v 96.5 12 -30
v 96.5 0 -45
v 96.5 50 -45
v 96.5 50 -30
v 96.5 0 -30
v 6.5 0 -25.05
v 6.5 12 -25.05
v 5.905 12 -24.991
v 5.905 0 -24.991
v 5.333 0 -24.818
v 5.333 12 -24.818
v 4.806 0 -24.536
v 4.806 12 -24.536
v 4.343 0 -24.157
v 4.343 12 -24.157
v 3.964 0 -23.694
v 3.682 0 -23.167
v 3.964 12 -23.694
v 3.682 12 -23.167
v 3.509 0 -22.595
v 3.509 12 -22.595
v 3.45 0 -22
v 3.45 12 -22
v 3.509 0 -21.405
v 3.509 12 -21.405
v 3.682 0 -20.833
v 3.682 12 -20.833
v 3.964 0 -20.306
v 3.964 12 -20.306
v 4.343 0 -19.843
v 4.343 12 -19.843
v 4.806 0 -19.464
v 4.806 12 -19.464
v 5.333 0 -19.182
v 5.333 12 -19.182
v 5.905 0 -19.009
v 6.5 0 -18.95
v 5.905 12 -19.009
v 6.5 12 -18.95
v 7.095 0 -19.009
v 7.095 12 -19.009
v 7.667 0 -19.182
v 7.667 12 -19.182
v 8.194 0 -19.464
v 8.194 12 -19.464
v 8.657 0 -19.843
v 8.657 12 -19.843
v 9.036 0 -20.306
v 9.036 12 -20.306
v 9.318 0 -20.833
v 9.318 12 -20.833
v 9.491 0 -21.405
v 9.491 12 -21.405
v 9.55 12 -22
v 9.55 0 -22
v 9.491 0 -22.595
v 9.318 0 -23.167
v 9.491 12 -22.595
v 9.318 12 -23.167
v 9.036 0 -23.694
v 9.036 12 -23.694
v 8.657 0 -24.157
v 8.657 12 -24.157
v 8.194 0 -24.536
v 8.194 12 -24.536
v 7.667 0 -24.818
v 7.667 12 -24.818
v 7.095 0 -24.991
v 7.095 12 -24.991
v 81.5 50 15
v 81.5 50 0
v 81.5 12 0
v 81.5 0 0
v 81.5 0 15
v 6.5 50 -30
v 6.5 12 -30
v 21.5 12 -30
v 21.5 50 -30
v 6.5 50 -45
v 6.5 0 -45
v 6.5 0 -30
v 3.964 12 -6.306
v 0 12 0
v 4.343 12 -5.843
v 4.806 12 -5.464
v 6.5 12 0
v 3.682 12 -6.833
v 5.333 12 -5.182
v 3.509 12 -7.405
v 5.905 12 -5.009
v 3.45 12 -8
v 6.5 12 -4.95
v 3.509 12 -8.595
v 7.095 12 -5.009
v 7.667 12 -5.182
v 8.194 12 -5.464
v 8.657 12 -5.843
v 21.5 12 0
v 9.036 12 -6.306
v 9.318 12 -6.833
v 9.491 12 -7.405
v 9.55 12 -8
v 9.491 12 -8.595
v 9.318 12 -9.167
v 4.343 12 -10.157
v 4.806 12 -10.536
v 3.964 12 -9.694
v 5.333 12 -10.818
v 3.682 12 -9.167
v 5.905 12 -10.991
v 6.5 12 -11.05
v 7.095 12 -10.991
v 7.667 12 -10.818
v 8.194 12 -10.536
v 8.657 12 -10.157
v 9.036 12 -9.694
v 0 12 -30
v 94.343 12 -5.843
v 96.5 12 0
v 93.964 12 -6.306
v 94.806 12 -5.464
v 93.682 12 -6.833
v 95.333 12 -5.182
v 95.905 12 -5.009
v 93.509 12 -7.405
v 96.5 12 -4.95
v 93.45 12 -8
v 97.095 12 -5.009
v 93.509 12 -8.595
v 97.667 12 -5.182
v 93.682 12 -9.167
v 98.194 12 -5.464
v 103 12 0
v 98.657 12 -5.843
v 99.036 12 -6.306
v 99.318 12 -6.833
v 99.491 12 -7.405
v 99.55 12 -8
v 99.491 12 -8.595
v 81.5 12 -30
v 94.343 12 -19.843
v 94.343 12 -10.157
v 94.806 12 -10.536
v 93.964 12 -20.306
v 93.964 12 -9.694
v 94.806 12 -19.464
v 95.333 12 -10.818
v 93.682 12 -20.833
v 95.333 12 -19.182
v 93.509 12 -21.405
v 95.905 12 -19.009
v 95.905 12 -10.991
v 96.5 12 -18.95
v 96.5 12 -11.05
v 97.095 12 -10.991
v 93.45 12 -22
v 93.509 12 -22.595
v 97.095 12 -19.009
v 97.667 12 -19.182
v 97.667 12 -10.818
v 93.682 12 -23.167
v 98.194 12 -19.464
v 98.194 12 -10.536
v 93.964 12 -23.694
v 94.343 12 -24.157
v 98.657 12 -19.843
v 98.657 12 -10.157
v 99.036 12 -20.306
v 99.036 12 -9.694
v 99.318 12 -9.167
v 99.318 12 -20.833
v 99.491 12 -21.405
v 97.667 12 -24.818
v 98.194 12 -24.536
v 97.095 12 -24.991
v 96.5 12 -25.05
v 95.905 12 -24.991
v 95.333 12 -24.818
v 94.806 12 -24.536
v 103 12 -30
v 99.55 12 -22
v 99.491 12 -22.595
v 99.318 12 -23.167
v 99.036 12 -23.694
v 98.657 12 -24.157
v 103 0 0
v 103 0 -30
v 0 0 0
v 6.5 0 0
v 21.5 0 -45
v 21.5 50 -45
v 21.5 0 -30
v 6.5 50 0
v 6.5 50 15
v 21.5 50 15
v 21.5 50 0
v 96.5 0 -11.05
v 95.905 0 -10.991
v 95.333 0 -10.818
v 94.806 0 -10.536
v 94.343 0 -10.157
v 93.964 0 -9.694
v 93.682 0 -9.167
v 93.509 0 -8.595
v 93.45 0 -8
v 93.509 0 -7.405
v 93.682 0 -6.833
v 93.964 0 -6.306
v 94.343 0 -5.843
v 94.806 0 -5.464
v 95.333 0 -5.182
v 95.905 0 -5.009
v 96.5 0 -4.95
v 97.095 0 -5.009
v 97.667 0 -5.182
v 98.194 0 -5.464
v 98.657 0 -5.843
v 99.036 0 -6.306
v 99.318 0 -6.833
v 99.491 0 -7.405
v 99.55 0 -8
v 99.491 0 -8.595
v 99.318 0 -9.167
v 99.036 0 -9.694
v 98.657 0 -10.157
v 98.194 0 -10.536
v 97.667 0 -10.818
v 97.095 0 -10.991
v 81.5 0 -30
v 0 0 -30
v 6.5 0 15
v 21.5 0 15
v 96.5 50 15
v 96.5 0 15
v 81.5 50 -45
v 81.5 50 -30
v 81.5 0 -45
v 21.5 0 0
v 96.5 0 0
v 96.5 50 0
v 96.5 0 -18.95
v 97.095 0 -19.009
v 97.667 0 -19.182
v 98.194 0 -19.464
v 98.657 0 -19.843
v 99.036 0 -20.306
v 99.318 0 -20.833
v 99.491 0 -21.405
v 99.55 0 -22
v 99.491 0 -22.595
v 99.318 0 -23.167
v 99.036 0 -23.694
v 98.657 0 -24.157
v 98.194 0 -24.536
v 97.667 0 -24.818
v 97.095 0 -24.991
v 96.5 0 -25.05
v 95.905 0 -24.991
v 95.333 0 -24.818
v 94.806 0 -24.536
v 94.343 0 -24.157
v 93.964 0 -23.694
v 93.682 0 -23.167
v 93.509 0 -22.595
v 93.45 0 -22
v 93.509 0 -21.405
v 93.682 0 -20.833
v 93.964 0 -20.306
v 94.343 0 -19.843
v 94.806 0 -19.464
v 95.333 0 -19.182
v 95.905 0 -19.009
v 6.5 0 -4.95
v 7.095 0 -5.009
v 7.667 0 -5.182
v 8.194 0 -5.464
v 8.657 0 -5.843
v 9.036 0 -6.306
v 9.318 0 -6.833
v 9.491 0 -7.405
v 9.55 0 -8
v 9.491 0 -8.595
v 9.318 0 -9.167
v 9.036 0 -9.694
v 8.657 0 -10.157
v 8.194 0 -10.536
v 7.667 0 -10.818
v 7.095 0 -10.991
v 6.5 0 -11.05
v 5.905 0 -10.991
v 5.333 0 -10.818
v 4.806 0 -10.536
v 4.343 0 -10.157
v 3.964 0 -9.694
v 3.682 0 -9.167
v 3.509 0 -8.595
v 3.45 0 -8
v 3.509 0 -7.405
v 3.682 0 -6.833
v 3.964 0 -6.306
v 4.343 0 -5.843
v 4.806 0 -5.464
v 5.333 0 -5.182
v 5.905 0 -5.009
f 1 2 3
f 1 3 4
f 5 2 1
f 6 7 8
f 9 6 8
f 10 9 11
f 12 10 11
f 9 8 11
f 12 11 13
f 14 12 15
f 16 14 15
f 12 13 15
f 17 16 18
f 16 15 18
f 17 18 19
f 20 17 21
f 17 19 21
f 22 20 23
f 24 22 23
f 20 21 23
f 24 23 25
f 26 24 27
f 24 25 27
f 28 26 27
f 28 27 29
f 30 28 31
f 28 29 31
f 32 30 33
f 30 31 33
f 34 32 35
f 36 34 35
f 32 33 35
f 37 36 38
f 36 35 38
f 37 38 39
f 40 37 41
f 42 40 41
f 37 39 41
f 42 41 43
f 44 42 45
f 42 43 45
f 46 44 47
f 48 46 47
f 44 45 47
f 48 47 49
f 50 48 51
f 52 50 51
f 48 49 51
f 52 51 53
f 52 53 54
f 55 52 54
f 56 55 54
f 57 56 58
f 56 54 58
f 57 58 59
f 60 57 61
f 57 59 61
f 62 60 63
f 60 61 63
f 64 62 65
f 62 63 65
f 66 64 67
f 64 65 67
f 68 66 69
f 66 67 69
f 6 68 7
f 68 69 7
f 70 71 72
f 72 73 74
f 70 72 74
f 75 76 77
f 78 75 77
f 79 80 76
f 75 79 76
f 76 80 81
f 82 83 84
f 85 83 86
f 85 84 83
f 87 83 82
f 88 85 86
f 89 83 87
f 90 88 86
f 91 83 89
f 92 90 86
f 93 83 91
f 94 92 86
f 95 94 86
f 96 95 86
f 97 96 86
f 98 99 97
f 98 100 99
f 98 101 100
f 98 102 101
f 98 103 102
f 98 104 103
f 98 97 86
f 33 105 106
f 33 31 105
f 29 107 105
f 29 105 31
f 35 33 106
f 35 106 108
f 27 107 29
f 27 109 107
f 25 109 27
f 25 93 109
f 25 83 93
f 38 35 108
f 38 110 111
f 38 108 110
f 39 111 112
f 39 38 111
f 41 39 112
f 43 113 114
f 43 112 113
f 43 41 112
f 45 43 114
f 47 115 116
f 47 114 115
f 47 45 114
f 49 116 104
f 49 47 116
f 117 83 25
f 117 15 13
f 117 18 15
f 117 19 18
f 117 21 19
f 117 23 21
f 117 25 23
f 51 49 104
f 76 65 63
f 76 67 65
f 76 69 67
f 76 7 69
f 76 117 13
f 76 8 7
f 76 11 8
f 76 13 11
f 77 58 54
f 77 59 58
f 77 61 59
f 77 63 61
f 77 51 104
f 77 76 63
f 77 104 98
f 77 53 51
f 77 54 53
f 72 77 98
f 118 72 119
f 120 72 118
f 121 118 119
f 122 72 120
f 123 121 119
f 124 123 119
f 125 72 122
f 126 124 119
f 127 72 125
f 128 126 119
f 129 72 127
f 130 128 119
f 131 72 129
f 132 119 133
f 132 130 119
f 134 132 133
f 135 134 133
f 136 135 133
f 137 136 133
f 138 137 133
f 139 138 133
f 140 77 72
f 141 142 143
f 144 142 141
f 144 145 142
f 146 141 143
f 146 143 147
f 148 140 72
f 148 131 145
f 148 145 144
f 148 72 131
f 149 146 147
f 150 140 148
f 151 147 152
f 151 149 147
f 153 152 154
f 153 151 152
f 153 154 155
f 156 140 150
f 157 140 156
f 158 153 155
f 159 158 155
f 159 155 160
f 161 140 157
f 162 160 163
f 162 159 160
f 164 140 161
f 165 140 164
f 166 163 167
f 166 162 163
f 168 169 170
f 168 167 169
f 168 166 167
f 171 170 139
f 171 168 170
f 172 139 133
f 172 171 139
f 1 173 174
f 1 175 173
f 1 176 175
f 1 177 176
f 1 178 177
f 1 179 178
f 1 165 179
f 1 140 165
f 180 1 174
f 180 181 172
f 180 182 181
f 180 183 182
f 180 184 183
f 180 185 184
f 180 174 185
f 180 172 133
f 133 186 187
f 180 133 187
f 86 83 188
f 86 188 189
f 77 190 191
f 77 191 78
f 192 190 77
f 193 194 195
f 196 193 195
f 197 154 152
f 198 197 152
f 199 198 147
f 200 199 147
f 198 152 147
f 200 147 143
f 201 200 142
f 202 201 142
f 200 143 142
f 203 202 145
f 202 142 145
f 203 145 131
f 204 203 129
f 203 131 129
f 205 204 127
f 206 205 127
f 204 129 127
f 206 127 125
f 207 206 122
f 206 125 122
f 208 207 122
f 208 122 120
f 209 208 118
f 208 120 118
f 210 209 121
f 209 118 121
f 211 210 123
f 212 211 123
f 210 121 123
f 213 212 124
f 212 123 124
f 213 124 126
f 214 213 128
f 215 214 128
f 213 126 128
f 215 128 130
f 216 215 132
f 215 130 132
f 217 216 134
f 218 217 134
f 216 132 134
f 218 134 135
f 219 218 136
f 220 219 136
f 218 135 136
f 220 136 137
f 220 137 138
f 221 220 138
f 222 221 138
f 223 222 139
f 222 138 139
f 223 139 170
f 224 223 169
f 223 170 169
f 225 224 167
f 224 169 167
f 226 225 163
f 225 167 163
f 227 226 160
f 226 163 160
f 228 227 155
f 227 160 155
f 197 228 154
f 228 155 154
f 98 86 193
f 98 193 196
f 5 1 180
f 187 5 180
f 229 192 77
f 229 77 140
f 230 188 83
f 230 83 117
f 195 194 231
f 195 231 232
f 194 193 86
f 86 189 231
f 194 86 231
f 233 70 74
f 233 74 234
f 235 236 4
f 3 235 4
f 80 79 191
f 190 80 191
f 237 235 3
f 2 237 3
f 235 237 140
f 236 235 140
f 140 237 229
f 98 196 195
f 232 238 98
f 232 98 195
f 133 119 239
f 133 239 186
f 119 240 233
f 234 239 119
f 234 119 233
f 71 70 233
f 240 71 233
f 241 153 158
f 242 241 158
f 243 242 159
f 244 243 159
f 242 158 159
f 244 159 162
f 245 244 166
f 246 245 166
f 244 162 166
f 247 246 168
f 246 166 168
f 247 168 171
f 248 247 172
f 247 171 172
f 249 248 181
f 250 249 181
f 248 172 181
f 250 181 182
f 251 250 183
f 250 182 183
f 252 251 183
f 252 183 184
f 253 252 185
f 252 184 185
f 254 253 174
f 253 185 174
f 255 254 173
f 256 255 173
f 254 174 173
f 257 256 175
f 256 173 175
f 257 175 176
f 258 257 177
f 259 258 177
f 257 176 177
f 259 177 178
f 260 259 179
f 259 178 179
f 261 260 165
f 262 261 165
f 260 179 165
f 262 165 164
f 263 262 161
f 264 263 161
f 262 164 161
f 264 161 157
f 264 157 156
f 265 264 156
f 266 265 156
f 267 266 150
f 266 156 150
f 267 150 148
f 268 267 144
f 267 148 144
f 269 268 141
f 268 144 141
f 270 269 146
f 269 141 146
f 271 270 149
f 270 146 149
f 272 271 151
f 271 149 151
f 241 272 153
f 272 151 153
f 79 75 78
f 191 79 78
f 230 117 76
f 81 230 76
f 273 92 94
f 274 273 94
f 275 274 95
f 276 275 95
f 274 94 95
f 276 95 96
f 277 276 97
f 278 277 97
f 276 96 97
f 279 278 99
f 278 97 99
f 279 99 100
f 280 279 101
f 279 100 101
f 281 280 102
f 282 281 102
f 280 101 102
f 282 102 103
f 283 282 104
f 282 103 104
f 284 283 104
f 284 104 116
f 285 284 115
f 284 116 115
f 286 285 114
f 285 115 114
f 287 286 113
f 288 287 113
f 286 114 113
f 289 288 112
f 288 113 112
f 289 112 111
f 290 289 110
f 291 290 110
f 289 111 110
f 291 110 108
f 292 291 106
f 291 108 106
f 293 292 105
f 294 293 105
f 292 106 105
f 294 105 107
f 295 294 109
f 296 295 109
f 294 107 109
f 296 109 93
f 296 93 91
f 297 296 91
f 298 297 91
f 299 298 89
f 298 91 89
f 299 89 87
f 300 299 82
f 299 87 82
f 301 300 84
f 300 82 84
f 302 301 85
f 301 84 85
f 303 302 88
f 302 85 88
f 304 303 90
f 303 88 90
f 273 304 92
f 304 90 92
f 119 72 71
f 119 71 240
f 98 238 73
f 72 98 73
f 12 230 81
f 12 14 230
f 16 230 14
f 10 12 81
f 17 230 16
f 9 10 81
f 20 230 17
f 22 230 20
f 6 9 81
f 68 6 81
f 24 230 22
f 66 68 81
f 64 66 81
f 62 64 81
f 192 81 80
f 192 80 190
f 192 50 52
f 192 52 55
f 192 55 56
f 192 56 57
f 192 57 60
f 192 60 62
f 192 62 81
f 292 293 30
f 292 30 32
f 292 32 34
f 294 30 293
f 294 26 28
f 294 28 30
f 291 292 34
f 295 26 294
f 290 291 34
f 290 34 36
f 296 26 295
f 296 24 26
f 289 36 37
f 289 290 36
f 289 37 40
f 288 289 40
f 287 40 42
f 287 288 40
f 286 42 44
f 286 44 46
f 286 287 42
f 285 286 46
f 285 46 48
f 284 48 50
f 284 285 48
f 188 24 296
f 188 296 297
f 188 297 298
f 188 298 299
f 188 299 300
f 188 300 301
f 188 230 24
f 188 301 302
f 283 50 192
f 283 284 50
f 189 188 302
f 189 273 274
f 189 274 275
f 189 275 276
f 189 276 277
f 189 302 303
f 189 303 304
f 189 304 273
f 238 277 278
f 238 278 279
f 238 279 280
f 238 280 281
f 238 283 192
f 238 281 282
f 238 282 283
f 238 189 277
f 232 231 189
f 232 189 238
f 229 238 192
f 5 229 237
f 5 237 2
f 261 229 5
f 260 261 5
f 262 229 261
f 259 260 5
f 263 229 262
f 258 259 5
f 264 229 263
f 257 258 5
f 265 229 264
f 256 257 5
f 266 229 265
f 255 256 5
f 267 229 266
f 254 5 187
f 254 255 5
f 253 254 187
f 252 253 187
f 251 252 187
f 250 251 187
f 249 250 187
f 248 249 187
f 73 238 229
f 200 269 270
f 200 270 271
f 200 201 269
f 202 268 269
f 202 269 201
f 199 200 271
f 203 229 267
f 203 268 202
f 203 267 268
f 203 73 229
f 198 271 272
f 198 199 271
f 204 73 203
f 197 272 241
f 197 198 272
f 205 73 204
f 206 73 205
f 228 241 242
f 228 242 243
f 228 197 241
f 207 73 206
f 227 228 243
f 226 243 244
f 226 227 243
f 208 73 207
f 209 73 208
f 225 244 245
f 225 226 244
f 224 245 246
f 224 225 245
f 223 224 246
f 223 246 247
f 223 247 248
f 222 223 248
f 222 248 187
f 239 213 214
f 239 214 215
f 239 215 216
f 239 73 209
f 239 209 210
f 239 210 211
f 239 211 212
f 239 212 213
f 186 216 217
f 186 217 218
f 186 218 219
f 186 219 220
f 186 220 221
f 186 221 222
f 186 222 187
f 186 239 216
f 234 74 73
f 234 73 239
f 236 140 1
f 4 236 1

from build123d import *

# Parameters (mm, degrees)
SKETCH1_W           = 103
SKETCH1_H           = 30
BOSS_EXTRUDE1_DEPTH = 12
SKETCH2_R           = 3.05
CUT_EXTRUDE1_DEPTH  = 12
SKETCH4_W           = 15
SKETCH4_H           = 15
BOSS_EXTRUDE3_DEPTH = 50


with BuildPart() as part:
    # Sketch1 → Boss-Extrude1 (new body)
    with BuildSketch(Plane(origin=(0, 0, 0), x_dir=(1, 0, 0), z_dir=(0, 1, 0))):
        with Locations((51.5, 15)):
            Rectangle(SKETCH1_W, SKETCH1_H)
    extrude(amount=BOSS_EXTRUDE1_DEPTH)

    # Sketch2 → Cut-Extrude1 (cut)
    with BuildSketch(Plane(origin=(0, 12, 0), x_dir=(1, 0, 0), z_dir=(0, 1, 0))):
        with Locations(Location((6.5, 8, 0), (0, 0, 270))):
            Circle(SKETCH2_R)
        with Locations(Location((6.5, 22, 0), (0, 0, 90))):
            Circle(SKETCH2_R)
        with Locations(Location((96.5, 8, 0), (0, 0, 90))):
            Circle(SKETCH2_R)
        with Locations(Location((96.5, 22, 0), (0, 0, 270))):
            Circle(SKETCH2_R)
    extrude(amount=-CUT_EXTRUDE1_DEPTH, mode=Mode.SUBTRACT)

    # Sketch4 → Boss-Extrude3 (add)
    with BuildSketch(Plane.XZ):
        with Locations((89, 7.5)):
            Rectangle(SKETCH4_W, SKETCH4_H)
        with Locations((89, -37.5)):
            Rectangle(SKETCH4_W, SKETCH4_H)
        with Locations((14, -37.5)):
            Rectangle(SKETCH4_W, SKETCH4_H)
        with Locations((14, 7.5)):
            Rectangle(SKETCH4_W, SKETCH4_H)
    extrude(amount=-BOSS_EXTRUDE3_DEPTH)


solid = part.part
